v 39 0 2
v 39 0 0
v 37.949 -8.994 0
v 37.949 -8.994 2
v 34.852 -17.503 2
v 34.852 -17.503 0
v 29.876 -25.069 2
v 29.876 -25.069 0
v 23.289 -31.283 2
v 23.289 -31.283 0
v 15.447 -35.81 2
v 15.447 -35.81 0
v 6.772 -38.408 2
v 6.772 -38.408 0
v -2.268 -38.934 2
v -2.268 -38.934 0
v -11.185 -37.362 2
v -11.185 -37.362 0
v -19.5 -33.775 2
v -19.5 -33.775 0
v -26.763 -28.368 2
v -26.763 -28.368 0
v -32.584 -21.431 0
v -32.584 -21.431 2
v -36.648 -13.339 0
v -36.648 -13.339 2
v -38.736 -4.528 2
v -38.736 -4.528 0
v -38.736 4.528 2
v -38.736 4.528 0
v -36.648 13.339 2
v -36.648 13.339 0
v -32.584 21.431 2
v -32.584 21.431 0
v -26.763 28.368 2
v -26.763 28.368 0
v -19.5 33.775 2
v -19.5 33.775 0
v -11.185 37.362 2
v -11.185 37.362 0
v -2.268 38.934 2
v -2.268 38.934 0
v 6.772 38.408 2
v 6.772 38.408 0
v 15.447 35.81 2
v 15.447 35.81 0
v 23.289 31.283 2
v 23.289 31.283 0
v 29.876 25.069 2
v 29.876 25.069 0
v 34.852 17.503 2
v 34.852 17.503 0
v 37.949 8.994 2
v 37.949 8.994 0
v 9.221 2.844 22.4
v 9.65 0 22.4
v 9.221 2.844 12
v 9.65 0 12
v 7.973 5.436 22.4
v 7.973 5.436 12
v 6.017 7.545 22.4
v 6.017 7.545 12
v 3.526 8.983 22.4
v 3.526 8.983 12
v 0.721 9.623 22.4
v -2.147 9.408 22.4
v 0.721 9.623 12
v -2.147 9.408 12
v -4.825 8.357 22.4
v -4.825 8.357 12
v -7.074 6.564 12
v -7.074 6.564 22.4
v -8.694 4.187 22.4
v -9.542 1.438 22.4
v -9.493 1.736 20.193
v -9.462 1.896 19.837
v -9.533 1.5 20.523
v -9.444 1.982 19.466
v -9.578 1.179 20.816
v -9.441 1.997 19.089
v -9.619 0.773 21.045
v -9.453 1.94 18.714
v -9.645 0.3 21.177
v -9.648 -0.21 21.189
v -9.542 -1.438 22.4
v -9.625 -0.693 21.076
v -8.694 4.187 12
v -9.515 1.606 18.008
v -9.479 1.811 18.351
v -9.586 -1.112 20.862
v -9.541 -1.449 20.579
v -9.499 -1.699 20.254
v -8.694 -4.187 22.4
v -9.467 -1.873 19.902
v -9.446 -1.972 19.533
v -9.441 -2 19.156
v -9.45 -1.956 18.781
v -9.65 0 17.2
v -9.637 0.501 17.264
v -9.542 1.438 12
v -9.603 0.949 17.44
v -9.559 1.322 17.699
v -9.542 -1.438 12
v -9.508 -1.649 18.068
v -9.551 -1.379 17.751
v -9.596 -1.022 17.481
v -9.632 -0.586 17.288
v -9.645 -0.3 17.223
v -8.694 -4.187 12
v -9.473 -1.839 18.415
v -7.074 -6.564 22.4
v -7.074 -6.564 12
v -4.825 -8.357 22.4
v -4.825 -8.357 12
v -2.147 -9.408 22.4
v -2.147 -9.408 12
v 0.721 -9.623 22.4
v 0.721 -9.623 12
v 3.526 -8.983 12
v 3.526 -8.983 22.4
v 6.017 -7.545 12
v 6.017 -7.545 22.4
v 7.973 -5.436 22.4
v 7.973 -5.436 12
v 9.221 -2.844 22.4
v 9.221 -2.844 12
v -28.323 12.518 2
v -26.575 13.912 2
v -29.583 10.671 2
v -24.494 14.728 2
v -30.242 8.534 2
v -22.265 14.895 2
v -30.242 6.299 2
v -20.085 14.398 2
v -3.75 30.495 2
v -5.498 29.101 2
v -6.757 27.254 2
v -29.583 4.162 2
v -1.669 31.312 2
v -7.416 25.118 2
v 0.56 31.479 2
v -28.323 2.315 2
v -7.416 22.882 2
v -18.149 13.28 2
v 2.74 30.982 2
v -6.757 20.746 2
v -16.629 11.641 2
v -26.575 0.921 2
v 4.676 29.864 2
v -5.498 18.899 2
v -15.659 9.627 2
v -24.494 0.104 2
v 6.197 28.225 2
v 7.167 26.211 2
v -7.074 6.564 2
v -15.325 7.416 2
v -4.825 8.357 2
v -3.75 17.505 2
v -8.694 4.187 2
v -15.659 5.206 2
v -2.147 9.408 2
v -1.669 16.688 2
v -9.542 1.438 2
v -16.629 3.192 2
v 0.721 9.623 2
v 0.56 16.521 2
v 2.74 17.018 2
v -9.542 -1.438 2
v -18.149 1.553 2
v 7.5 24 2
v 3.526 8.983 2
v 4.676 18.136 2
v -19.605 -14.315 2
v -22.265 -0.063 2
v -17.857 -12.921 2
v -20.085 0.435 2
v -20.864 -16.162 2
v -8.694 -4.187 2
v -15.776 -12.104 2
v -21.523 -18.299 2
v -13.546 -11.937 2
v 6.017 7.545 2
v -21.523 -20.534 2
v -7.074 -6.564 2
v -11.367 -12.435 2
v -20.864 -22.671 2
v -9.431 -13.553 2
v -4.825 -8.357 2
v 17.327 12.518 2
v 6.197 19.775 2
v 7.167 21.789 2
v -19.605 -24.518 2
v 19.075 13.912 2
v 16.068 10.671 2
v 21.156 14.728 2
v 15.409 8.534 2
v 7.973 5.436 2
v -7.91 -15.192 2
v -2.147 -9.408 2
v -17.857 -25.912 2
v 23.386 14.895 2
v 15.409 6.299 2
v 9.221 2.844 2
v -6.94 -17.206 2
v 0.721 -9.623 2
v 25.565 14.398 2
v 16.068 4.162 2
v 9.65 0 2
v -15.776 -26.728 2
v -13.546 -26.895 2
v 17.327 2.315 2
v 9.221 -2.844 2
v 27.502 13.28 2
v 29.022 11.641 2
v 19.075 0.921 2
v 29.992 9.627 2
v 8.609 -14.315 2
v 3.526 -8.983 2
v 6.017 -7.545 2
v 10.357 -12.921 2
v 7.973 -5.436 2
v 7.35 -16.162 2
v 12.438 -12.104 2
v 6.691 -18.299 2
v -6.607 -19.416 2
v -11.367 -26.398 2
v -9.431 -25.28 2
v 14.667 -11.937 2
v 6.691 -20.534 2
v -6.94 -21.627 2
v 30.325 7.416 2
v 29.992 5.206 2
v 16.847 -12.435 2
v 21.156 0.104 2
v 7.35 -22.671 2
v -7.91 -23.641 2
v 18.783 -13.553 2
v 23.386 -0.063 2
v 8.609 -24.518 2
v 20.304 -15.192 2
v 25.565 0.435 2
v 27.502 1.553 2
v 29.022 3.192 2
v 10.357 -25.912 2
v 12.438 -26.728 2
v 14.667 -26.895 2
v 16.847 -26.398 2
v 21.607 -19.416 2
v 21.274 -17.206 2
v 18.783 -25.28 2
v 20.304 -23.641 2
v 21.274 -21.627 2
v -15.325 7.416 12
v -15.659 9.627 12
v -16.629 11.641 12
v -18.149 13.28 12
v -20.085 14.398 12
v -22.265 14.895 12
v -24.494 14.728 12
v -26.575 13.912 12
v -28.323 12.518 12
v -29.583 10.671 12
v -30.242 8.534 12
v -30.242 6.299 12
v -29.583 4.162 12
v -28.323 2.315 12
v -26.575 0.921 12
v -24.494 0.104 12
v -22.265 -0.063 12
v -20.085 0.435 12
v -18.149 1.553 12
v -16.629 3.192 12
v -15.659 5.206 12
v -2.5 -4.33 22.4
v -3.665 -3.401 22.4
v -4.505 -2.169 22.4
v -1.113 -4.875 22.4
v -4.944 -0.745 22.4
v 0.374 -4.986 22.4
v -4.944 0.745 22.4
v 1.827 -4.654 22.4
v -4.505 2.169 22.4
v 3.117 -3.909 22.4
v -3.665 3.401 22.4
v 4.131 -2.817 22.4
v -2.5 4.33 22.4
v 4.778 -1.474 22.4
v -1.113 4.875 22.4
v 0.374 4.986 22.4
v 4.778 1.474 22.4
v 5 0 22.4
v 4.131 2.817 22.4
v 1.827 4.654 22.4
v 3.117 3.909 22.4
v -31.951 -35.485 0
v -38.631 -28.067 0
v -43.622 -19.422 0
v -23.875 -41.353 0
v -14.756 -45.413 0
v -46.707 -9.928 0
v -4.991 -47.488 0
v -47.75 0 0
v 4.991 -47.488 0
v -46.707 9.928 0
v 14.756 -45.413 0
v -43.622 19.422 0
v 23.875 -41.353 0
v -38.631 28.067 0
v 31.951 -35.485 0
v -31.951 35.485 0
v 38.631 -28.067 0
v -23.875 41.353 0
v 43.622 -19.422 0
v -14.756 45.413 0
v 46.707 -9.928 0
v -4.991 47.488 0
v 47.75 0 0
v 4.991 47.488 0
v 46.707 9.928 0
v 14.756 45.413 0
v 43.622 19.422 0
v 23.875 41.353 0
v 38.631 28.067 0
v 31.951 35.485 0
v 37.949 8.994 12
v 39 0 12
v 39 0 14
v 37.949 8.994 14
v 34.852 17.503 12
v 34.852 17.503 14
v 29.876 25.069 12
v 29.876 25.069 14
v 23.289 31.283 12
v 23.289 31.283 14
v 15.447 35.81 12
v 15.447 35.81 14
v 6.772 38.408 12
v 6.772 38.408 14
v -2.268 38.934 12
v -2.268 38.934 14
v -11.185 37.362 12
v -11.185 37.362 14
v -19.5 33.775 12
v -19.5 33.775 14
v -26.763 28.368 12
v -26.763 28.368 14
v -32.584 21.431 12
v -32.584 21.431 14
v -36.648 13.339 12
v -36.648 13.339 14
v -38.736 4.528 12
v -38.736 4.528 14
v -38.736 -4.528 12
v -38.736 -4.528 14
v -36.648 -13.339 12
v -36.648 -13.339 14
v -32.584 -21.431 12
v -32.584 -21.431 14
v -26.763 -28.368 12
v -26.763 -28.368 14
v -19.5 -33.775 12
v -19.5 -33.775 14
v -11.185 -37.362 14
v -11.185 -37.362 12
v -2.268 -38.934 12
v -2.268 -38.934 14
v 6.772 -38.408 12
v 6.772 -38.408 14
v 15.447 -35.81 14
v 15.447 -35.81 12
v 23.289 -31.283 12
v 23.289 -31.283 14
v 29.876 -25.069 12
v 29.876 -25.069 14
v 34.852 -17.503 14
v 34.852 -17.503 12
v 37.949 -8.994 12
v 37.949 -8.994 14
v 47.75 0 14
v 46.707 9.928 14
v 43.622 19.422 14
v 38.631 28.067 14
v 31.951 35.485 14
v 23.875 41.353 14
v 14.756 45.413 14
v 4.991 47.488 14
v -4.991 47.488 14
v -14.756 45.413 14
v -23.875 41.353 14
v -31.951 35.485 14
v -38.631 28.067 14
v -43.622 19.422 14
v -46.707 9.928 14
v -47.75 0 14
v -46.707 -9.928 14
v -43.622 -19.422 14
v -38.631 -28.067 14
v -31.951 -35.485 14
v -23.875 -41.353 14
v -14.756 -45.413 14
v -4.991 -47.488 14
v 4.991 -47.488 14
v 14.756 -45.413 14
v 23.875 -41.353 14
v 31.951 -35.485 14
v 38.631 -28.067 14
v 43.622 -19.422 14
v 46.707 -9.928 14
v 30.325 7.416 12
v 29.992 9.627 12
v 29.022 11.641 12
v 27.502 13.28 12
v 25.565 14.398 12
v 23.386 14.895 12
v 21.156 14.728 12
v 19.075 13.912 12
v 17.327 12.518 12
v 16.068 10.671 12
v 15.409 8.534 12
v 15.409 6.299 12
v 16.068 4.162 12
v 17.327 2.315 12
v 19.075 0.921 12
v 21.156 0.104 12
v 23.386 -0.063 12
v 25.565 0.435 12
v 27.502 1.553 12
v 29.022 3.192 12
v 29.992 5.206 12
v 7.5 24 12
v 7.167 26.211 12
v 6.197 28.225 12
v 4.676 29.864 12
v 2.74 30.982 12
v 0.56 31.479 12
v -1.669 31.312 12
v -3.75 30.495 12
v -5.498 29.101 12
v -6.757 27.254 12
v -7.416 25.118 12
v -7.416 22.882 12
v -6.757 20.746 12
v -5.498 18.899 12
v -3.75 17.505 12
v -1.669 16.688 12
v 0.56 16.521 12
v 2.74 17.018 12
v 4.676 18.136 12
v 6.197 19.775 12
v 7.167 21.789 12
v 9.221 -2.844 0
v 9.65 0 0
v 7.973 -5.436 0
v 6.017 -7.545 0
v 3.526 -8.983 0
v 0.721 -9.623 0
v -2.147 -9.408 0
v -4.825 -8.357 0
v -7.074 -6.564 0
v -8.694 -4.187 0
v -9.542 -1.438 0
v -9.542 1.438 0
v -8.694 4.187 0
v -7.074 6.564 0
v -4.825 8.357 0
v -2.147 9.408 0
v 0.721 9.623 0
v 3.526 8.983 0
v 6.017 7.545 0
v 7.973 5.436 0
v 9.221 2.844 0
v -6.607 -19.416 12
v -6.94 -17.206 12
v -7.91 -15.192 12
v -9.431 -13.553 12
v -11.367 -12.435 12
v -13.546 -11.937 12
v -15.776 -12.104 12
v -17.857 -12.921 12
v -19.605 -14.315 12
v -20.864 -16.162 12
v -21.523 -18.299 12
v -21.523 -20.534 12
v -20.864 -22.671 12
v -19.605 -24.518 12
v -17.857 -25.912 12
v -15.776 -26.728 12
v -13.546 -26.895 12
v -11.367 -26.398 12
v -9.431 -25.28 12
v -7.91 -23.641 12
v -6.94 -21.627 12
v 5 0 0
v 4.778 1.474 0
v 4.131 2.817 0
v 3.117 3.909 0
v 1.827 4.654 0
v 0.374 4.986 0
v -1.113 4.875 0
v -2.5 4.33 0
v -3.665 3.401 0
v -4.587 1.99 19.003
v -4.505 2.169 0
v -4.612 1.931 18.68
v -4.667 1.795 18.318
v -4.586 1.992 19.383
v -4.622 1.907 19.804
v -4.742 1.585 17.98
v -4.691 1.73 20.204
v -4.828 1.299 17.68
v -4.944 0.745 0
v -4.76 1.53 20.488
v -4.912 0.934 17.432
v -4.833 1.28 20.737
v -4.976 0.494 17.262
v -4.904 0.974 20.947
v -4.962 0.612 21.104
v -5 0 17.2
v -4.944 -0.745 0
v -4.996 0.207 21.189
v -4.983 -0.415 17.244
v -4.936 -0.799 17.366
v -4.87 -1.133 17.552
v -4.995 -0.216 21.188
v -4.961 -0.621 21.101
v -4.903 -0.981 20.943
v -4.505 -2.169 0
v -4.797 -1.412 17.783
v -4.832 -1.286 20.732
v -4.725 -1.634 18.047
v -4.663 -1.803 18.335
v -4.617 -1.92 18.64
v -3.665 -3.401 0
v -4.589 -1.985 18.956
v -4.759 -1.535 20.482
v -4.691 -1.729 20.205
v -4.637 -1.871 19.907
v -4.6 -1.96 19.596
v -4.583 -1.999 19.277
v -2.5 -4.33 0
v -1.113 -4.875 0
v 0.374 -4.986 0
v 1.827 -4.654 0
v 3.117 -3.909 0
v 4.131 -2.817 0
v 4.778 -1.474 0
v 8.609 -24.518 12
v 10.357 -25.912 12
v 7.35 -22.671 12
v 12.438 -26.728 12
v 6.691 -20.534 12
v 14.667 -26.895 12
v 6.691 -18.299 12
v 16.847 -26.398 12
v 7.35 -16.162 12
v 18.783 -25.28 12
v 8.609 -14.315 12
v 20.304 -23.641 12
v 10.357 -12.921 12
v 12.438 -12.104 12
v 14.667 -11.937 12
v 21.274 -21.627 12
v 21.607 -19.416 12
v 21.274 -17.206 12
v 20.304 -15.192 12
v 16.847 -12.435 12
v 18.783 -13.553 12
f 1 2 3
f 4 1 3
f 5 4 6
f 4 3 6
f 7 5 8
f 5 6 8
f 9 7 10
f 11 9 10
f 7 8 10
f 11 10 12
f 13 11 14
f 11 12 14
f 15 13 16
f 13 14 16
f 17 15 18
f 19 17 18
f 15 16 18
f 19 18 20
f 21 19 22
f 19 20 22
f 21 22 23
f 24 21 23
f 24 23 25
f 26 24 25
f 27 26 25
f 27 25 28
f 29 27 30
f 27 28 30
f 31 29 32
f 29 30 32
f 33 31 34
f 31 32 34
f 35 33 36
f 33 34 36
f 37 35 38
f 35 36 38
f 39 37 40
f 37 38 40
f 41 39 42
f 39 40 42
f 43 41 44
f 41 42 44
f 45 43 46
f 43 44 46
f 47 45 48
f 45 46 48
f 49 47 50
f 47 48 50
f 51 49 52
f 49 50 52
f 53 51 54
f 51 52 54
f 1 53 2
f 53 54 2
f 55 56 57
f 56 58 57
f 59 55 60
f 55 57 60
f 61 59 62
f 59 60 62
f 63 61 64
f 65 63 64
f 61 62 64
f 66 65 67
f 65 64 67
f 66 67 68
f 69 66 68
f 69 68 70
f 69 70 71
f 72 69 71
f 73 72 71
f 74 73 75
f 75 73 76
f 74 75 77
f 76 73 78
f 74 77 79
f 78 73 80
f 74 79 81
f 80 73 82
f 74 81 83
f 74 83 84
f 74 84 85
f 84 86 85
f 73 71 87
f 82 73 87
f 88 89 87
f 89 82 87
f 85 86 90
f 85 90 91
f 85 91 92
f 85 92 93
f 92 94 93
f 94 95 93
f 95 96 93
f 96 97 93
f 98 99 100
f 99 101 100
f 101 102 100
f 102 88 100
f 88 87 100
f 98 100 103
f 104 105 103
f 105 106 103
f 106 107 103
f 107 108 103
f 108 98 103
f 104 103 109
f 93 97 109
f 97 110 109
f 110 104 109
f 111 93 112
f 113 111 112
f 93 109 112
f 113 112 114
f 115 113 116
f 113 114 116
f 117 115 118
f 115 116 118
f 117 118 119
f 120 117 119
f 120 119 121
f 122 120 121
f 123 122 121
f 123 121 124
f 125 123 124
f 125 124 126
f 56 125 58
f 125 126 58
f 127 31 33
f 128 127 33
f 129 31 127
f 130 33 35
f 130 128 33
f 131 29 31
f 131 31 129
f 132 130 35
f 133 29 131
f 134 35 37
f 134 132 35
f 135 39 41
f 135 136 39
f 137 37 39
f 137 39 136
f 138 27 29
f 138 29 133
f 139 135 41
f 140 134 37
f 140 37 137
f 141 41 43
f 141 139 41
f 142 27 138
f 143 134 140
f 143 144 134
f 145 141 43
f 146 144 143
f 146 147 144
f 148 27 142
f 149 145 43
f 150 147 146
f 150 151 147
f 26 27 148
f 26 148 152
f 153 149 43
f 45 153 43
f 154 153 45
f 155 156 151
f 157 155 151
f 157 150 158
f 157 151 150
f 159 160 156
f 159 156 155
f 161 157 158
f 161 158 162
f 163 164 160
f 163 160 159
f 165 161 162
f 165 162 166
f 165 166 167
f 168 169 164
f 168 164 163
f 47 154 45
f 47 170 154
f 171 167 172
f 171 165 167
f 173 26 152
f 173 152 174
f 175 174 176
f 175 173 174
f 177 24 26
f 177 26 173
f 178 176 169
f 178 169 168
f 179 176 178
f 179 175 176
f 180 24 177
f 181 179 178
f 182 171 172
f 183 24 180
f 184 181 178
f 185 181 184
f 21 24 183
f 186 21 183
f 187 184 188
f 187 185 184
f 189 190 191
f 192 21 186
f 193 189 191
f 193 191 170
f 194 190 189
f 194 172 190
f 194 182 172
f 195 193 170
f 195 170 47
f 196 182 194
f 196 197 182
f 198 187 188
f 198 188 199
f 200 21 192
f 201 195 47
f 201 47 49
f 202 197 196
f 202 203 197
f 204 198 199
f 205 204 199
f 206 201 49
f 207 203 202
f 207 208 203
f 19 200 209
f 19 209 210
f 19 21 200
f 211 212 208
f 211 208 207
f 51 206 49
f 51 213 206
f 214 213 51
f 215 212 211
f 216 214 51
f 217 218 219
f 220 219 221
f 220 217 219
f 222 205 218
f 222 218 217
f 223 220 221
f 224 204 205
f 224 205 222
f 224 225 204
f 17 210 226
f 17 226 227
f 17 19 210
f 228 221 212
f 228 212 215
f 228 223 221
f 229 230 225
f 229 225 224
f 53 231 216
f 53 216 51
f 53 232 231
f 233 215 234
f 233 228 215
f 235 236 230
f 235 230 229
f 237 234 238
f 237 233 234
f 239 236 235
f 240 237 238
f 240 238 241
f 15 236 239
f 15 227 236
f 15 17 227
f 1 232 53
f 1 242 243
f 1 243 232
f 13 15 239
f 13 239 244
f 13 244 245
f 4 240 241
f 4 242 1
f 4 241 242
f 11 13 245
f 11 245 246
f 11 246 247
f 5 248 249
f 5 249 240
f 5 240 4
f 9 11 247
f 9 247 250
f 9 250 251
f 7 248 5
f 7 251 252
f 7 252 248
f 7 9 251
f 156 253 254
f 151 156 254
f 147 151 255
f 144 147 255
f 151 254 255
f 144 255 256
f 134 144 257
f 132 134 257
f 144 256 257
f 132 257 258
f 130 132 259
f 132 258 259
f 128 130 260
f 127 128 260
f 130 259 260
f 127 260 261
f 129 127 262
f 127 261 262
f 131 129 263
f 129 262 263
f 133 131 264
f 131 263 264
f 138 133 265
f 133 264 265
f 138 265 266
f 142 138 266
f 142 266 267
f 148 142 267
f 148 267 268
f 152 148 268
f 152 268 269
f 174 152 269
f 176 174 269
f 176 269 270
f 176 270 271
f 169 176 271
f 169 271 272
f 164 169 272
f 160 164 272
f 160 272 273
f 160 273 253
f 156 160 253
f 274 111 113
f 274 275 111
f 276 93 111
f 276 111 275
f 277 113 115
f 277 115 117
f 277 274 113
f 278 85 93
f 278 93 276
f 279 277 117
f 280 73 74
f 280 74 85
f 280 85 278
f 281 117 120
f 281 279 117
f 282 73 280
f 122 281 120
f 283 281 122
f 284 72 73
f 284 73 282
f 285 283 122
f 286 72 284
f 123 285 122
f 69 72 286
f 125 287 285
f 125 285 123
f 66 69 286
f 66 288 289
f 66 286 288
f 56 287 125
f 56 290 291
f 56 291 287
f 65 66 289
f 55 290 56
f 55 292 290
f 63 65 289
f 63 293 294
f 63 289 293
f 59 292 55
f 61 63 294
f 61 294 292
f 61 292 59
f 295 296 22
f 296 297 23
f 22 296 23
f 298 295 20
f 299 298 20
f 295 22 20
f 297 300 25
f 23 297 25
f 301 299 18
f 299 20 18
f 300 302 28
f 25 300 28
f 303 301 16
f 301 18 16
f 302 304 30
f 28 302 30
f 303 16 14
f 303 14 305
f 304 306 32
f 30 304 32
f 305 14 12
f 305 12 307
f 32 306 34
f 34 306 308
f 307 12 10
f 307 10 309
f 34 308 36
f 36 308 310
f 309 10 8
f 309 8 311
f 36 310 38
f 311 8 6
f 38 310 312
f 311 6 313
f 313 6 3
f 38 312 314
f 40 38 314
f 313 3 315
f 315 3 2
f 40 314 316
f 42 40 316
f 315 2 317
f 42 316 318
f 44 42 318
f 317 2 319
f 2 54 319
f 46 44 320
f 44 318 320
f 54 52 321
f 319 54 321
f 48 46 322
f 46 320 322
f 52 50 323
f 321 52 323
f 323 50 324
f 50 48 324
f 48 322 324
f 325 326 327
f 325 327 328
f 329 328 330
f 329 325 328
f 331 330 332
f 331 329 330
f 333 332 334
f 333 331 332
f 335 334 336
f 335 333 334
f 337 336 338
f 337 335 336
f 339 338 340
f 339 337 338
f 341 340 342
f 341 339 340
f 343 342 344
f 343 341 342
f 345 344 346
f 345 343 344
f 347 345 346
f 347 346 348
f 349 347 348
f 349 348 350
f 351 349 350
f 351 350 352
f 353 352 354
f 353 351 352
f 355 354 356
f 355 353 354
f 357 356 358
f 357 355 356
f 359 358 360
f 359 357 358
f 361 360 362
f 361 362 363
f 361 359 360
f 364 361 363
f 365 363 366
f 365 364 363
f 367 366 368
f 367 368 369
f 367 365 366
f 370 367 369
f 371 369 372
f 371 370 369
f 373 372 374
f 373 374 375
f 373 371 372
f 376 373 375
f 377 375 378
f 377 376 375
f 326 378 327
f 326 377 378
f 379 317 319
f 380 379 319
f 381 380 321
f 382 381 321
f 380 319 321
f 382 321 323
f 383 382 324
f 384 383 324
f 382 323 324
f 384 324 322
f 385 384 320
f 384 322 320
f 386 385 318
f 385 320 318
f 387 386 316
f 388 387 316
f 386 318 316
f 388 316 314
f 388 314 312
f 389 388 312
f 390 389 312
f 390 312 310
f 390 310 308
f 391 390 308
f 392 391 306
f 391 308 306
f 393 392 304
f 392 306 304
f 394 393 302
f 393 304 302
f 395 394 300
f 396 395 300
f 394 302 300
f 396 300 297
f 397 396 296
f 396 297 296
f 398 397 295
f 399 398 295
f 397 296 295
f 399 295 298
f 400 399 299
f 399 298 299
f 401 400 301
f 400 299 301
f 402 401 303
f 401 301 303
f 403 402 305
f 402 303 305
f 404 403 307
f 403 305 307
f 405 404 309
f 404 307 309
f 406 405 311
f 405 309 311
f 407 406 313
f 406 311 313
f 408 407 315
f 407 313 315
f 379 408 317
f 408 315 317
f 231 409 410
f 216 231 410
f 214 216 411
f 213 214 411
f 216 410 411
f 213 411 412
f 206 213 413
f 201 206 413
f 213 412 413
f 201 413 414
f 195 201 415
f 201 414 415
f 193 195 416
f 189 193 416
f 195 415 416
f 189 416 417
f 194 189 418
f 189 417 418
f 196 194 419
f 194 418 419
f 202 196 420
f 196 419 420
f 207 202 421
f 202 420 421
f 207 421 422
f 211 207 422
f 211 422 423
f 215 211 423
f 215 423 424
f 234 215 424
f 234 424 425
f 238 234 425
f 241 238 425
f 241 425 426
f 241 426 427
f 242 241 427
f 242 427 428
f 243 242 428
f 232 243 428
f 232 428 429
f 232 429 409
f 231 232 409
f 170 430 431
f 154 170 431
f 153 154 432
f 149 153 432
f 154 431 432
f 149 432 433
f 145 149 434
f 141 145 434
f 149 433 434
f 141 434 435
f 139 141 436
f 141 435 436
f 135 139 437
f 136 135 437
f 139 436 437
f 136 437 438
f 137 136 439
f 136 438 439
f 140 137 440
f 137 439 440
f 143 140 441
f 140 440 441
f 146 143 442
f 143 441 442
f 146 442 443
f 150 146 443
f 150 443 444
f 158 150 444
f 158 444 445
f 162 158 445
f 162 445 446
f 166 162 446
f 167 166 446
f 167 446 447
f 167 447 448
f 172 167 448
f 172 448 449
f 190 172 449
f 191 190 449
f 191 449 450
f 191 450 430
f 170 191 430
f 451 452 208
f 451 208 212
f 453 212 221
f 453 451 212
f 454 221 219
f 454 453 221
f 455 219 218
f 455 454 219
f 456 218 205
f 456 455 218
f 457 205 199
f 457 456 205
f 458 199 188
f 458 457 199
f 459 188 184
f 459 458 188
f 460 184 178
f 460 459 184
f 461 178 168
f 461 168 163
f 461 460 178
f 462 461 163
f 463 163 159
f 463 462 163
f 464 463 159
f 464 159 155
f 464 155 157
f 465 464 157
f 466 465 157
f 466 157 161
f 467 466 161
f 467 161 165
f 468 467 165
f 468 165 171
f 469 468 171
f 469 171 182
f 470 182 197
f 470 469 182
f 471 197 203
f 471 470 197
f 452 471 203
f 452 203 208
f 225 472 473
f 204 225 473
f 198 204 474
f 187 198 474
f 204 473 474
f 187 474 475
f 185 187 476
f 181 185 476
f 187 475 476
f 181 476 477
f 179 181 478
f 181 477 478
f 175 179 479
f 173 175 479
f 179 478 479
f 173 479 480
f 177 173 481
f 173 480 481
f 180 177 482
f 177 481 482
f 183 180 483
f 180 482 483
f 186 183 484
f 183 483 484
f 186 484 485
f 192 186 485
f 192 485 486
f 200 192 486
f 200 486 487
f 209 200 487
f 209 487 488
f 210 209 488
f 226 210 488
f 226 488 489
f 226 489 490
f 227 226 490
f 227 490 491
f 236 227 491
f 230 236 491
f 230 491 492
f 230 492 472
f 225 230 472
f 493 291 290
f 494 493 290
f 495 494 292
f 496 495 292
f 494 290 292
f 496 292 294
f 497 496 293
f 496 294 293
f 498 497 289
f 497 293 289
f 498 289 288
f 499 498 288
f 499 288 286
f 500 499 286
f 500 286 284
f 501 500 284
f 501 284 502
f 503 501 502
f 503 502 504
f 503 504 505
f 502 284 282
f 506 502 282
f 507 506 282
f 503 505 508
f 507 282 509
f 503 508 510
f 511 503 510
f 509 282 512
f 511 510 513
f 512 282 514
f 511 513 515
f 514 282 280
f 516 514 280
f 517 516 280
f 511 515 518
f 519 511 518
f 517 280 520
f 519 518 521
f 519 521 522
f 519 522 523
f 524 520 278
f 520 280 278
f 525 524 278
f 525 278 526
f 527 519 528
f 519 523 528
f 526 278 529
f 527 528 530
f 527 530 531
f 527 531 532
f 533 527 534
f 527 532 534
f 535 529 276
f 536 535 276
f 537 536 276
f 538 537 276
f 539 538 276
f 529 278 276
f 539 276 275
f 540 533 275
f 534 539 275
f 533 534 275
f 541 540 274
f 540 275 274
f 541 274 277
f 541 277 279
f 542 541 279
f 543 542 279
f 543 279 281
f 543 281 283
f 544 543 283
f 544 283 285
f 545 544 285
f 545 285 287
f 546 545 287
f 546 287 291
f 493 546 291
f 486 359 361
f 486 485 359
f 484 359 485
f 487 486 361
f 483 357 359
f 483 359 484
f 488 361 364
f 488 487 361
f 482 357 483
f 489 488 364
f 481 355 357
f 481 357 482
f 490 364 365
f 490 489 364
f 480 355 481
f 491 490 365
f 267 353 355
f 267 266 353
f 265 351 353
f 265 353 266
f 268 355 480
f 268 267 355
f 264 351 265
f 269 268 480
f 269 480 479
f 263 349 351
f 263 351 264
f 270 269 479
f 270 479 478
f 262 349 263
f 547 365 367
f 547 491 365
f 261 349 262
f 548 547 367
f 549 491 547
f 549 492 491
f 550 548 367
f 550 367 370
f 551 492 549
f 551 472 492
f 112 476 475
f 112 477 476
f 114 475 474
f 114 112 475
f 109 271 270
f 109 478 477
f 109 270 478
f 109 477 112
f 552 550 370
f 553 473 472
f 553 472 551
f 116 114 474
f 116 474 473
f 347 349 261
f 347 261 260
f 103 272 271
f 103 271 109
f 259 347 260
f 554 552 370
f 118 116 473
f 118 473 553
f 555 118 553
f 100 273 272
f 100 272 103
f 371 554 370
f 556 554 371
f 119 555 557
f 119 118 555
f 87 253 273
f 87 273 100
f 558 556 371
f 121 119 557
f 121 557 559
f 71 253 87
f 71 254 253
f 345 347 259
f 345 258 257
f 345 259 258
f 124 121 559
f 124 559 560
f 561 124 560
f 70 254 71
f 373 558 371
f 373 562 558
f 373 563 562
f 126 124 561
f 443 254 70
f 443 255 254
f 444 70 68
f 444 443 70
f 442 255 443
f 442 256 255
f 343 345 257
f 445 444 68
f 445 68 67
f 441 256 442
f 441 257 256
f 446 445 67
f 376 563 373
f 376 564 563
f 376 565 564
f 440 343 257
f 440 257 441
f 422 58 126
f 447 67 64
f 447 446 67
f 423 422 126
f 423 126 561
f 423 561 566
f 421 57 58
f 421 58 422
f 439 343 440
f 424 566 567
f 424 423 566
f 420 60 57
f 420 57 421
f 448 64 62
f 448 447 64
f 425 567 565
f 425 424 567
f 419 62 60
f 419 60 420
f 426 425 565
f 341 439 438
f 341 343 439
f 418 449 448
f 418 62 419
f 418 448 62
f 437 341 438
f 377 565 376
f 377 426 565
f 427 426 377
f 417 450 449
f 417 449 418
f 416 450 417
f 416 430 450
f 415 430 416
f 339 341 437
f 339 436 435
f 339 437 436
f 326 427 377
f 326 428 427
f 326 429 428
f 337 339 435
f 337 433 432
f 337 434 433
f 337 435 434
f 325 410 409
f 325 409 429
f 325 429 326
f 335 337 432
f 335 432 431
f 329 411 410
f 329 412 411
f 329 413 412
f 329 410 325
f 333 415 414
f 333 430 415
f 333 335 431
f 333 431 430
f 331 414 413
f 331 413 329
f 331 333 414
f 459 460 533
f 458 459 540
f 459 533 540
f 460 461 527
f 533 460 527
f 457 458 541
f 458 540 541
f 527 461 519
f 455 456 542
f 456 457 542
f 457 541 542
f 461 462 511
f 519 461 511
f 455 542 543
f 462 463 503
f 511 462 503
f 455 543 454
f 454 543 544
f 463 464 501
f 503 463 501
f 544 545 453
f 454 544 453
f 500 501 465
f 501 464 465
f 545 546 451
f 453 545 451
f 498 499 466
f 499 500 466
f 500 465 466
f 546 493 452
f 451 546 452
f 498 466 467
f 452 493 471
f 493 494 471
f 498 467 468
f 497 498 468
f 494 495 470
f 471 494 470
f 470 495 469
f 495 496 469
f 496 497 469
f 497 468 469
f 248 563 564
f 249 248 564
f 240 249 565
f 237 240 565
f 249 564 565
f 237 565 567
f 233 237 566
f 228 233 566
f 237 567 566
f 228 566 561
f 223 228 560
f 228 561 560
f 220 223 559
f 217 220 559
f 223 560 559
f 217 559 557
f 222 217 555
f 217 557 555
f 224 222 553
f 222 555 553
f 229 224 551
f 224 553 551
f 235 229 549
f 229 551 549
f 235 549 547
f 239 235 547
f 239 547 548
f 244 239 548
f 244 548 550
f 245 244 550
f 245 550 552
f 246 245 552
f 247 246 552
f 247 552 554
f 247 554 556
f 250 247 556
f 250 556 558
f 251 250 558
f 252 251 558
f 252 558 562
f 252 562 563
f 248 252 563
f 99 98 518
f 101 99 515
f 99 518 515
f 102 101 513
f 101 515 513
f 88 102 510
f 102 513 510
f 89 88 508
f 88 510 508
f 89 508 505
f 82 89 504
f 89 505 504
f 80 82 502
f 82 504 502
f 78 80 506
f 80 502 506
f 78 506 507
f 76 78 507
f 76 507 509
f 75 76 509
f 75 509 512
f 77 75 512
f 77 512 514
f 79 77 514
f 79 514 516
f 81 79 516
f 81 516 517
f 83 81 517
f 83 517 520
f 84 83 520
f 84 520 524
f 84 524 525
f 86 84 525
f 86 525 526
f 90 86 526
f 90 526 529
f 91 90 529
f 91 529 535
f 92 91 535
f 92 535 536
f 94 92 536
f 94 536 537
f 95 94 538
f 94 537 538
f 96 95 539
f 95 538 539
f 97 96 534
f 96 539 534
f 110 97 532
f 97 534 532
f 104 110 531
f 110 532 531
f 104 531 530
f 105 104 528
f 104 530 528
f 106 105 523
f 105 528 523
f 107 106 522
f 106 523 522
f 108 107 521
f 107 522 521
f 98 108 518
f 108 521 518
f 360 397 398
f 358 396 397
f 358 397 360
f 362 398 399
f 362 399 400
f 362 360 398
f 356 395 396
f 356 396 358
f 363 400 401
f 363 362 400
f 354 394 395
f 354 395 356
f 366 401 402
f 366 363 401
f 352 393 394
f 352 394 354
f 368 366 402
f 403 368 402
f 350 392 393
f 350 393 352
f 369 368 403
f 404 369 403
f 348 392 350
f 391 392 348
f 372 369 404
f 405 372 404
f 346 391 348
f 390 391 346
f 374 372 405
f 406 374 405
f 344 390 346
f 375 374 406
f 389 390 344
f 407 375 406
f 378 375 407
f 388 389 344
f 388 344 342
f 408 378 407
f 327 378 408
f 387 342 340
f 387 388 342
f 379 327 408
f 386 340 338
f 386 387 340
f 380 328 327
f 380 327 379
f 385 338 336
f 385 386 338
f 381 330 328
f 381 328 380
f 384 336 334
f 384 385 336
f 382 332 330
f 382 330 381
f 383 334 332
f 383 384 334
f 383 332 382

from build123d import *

# Parameters (mm, degrees)
SKETCH_1_R               = 47.75
EXTRUDE_1_DEPTH          = 14
SKETCH_2_R               = 9.65
EXTRUDE_2_DEPTH          = 8.4
SKETCH_3_R               = 5
CUT_EXTRUDE_1_DEPTH      = 22.4
CUT_EXTRUDE_2_REACH      = 73.147
CUT_EXTRUDE_2_END_RADIUS = 9.65
SKETCH_6_R               = 2
CUT_EXTRUDE_START        = -2
SKETCH_7_R               = 39
SKETCH_7_R_2             = 9.65
CUT_EXTRUDE_3_DEPTH      = 2
SKETCH_8_R               = 39
SKETCH_8_R_2             = 9.65
CUT_EXTRUDE_4_DEPTH      = 2
CUT_EXTRUDE_5_REACH      = 70.587
SKETCH_9_R               = 7.5


with BuildPart() as part:
    # 草图1 → 凸台-拉伸1 (new body)
    with BuildSketch(Plane.XY):
        Circle(SKETCH_1_R)
    extrude(amount=EXTRUDE_1_DEPTH)

    # 草图2 → 凸台-拉伸2 (add)
    with BuildSketch(Plane.XY.offset(14)):
        Circle(SKETCH_2_R)
    extrude(amount=EXTRUDE_2_DEPTH)

    # 草图3 → 切除-拉伸1 (cut)
    with BuildSketch(Plane.XY.offset(22.4)):
        Circle(SKETCH_3_R)
    extrude(amount=-CUT_EXTRUDE_1_DEPTH, mode=Mode.SUBTRACT)

    # 切除-拉伸2: up to this cylinder (the profile starts inside it)
    cut_extrude_2_end = Plane(origin=(0, 0, 19.2), z_dir=(0, 0, -1)) * Cylinder(CUT_EXTRUDE_2_END_RADIUS, 166.594, mode=Mode.PRIVATE)
    # 草图6 → 切除-拉伸2 (cut, up to the surface)
    with BuildSketch(Plane(origin=(0, 0, 0), x_dir=(0, 0, -1), z_dir=(1, 0, 0)), mode=Mode.PRIVATE) as cut_extrude_2_sk1:
        with Locations((-19.2, 0)):
            Circle(SKETCH_6_R)
    cut_extrude_2_tool1 = extrude(cut_extrude_2_sk1.sketch, amount=-CUT_EXTRUDE_2_REACH, mode=Mode.PRIVATE) & cut_extrude_2_end
    add(cut_extrude_2_tool1.solids().sort_by_distance((0, 0, 19.2))[0], mode=Mode.SUBTRACT)

    # 草图7 → 切除-拉伸3 (cut)
    with BuildSketch(Plane.XY.offset(14).offset(CUT_EXTRUDE_START)):
        Circle(SKETCH_7_R)
        Circle(SKETCH_7_R_2, mode=Mode.SUBTRACT)
    extrude(amount=CUT_EXTRUDE_3_DEPTH, mode=Mode.SUBTRACT)

    # 草图8 → 切除-拉伸4 (cut)
    with BuildSketch(Plane(origin=(0, 0, 0), x_dir=(-1, 0, 0), z_dir=(0, 0, -1))):
        with Locations(Location((0, 0, 0), (0, 0, 180))):
            Circle(SKETCH_8_R)
        with Locations(Location((0, 0, 0), (0, 0, 180))):
            Circle(SKETCH_8_R_2, mode=Mode.SUBTRACT)
    extrude(amount=-CUT_EXTRUDE_4_DEPTH, mode=Mode.SUBTRACT)

    # 草图9 → 切除-拉伸5 (cut, up to next)
    with BuildSketch(Plane.XY.offset(12), mode=Mode.PRIVATE) as cut_extrude_5_sk1:
        with Locations((0, 24)):
            Circle(SKETCH_9_R)
    cut_extrude_5_tool1 = extrude(cut_extrude_5_sk1.sketch, amount=-CUT_EXTRUDE_5_REACH, mode=Mode.PRIVATE) & part.part
    # 草图9 → 切除-拉伸5 (cut, up to next)
    with BuildSketch(Plane.XY.offset(12), mode=Mode.PRIVATE) as cut_extrude_5_sk2:
        with Locations((22.825356391, 7.416407865)):
            Circle(SKETCH_9_R)
    cut_extrude_5_tool2 = extrude(cut_extrude_5_sk2.sketch, amount=-CUT_EXTRUDE_5_REACH, mode=Mode.PRIVATE) & part.part
    # 草图9 → 切除-拉伸5 (cut, up to next)
    with BuildSketch(Plane.XY.offset(12), mode=Mode.PRIVATE) as cut_extrude_5_sk3:
        with Locations((14.106846055, -19.416407865)):
            Circle(SKETCH_9_R)
    cut_extrude_5_tool3 = extrude(cut_extrude_5_sk3.sketch, amount=-CUT_EXTRUDE_5_REACH, mode=Mode.PRIVATE) & part.part
    # 草图9 → 切除-拉伸5 (cut, up to next)
    with BuildSketch(Plane.XY.offset(12), mode=Mode.PRIVATE) as cut_extrude_5_sk4:
        with Locations((-14.106846055, -19.416407865)):
            Circle(SKETCH_9_R)
    cut_extrude_5_tool4 = extrude(cut_extrude_5_sk4.sketch, amount=-CUT_EXTRUDE_5_REACH, mode=Mode.PRIVATE) & part.part
    # 草图9 → 切除-拉伸5 (cut, up to next)
    with BuildSketch(Plane.XY.offset(12), mode=Mode.PRIVATE) as cut_extrude_5_sk5:
        with Locations((-22.825356391, 7.416407865)):
            Circle(SKETCH_9_R)
    cut_extrude_5_tool5 = extrude(cut_extrude_5_sk5.sketch, amount=-CUT_EXTRUDE_5_REACH, mode=Mode.PRIVATE) & part.part
    add(cut_extrude_5_tool1.solids().sort_by_distance((0, 24, 12))[0], mode=Mode.SUBTRACT)
    add(cut_extrude_5_tool2.solids().sort_by_distance((22.825356, 7.416408, 12))[0], mode=Mode.SUBTRACT)
    add(cut_extrude_5_tool3.solids().sort_by_distance((14.106846, -19.416408, 12))[0], mode=Mode.SUBTRACT)
    add(cut_extrude_5_tool4.solids().sort_by_distance((-14.106846, -19.416408, 12))[0], mode=Mode.SUBTRACT)
    add(cut_extrude_5_tool5.solids().sort_by_distance((-22.825356, 7.416408, 12))[0], mode=Mode.SUBTRACT)


solid = part.part
